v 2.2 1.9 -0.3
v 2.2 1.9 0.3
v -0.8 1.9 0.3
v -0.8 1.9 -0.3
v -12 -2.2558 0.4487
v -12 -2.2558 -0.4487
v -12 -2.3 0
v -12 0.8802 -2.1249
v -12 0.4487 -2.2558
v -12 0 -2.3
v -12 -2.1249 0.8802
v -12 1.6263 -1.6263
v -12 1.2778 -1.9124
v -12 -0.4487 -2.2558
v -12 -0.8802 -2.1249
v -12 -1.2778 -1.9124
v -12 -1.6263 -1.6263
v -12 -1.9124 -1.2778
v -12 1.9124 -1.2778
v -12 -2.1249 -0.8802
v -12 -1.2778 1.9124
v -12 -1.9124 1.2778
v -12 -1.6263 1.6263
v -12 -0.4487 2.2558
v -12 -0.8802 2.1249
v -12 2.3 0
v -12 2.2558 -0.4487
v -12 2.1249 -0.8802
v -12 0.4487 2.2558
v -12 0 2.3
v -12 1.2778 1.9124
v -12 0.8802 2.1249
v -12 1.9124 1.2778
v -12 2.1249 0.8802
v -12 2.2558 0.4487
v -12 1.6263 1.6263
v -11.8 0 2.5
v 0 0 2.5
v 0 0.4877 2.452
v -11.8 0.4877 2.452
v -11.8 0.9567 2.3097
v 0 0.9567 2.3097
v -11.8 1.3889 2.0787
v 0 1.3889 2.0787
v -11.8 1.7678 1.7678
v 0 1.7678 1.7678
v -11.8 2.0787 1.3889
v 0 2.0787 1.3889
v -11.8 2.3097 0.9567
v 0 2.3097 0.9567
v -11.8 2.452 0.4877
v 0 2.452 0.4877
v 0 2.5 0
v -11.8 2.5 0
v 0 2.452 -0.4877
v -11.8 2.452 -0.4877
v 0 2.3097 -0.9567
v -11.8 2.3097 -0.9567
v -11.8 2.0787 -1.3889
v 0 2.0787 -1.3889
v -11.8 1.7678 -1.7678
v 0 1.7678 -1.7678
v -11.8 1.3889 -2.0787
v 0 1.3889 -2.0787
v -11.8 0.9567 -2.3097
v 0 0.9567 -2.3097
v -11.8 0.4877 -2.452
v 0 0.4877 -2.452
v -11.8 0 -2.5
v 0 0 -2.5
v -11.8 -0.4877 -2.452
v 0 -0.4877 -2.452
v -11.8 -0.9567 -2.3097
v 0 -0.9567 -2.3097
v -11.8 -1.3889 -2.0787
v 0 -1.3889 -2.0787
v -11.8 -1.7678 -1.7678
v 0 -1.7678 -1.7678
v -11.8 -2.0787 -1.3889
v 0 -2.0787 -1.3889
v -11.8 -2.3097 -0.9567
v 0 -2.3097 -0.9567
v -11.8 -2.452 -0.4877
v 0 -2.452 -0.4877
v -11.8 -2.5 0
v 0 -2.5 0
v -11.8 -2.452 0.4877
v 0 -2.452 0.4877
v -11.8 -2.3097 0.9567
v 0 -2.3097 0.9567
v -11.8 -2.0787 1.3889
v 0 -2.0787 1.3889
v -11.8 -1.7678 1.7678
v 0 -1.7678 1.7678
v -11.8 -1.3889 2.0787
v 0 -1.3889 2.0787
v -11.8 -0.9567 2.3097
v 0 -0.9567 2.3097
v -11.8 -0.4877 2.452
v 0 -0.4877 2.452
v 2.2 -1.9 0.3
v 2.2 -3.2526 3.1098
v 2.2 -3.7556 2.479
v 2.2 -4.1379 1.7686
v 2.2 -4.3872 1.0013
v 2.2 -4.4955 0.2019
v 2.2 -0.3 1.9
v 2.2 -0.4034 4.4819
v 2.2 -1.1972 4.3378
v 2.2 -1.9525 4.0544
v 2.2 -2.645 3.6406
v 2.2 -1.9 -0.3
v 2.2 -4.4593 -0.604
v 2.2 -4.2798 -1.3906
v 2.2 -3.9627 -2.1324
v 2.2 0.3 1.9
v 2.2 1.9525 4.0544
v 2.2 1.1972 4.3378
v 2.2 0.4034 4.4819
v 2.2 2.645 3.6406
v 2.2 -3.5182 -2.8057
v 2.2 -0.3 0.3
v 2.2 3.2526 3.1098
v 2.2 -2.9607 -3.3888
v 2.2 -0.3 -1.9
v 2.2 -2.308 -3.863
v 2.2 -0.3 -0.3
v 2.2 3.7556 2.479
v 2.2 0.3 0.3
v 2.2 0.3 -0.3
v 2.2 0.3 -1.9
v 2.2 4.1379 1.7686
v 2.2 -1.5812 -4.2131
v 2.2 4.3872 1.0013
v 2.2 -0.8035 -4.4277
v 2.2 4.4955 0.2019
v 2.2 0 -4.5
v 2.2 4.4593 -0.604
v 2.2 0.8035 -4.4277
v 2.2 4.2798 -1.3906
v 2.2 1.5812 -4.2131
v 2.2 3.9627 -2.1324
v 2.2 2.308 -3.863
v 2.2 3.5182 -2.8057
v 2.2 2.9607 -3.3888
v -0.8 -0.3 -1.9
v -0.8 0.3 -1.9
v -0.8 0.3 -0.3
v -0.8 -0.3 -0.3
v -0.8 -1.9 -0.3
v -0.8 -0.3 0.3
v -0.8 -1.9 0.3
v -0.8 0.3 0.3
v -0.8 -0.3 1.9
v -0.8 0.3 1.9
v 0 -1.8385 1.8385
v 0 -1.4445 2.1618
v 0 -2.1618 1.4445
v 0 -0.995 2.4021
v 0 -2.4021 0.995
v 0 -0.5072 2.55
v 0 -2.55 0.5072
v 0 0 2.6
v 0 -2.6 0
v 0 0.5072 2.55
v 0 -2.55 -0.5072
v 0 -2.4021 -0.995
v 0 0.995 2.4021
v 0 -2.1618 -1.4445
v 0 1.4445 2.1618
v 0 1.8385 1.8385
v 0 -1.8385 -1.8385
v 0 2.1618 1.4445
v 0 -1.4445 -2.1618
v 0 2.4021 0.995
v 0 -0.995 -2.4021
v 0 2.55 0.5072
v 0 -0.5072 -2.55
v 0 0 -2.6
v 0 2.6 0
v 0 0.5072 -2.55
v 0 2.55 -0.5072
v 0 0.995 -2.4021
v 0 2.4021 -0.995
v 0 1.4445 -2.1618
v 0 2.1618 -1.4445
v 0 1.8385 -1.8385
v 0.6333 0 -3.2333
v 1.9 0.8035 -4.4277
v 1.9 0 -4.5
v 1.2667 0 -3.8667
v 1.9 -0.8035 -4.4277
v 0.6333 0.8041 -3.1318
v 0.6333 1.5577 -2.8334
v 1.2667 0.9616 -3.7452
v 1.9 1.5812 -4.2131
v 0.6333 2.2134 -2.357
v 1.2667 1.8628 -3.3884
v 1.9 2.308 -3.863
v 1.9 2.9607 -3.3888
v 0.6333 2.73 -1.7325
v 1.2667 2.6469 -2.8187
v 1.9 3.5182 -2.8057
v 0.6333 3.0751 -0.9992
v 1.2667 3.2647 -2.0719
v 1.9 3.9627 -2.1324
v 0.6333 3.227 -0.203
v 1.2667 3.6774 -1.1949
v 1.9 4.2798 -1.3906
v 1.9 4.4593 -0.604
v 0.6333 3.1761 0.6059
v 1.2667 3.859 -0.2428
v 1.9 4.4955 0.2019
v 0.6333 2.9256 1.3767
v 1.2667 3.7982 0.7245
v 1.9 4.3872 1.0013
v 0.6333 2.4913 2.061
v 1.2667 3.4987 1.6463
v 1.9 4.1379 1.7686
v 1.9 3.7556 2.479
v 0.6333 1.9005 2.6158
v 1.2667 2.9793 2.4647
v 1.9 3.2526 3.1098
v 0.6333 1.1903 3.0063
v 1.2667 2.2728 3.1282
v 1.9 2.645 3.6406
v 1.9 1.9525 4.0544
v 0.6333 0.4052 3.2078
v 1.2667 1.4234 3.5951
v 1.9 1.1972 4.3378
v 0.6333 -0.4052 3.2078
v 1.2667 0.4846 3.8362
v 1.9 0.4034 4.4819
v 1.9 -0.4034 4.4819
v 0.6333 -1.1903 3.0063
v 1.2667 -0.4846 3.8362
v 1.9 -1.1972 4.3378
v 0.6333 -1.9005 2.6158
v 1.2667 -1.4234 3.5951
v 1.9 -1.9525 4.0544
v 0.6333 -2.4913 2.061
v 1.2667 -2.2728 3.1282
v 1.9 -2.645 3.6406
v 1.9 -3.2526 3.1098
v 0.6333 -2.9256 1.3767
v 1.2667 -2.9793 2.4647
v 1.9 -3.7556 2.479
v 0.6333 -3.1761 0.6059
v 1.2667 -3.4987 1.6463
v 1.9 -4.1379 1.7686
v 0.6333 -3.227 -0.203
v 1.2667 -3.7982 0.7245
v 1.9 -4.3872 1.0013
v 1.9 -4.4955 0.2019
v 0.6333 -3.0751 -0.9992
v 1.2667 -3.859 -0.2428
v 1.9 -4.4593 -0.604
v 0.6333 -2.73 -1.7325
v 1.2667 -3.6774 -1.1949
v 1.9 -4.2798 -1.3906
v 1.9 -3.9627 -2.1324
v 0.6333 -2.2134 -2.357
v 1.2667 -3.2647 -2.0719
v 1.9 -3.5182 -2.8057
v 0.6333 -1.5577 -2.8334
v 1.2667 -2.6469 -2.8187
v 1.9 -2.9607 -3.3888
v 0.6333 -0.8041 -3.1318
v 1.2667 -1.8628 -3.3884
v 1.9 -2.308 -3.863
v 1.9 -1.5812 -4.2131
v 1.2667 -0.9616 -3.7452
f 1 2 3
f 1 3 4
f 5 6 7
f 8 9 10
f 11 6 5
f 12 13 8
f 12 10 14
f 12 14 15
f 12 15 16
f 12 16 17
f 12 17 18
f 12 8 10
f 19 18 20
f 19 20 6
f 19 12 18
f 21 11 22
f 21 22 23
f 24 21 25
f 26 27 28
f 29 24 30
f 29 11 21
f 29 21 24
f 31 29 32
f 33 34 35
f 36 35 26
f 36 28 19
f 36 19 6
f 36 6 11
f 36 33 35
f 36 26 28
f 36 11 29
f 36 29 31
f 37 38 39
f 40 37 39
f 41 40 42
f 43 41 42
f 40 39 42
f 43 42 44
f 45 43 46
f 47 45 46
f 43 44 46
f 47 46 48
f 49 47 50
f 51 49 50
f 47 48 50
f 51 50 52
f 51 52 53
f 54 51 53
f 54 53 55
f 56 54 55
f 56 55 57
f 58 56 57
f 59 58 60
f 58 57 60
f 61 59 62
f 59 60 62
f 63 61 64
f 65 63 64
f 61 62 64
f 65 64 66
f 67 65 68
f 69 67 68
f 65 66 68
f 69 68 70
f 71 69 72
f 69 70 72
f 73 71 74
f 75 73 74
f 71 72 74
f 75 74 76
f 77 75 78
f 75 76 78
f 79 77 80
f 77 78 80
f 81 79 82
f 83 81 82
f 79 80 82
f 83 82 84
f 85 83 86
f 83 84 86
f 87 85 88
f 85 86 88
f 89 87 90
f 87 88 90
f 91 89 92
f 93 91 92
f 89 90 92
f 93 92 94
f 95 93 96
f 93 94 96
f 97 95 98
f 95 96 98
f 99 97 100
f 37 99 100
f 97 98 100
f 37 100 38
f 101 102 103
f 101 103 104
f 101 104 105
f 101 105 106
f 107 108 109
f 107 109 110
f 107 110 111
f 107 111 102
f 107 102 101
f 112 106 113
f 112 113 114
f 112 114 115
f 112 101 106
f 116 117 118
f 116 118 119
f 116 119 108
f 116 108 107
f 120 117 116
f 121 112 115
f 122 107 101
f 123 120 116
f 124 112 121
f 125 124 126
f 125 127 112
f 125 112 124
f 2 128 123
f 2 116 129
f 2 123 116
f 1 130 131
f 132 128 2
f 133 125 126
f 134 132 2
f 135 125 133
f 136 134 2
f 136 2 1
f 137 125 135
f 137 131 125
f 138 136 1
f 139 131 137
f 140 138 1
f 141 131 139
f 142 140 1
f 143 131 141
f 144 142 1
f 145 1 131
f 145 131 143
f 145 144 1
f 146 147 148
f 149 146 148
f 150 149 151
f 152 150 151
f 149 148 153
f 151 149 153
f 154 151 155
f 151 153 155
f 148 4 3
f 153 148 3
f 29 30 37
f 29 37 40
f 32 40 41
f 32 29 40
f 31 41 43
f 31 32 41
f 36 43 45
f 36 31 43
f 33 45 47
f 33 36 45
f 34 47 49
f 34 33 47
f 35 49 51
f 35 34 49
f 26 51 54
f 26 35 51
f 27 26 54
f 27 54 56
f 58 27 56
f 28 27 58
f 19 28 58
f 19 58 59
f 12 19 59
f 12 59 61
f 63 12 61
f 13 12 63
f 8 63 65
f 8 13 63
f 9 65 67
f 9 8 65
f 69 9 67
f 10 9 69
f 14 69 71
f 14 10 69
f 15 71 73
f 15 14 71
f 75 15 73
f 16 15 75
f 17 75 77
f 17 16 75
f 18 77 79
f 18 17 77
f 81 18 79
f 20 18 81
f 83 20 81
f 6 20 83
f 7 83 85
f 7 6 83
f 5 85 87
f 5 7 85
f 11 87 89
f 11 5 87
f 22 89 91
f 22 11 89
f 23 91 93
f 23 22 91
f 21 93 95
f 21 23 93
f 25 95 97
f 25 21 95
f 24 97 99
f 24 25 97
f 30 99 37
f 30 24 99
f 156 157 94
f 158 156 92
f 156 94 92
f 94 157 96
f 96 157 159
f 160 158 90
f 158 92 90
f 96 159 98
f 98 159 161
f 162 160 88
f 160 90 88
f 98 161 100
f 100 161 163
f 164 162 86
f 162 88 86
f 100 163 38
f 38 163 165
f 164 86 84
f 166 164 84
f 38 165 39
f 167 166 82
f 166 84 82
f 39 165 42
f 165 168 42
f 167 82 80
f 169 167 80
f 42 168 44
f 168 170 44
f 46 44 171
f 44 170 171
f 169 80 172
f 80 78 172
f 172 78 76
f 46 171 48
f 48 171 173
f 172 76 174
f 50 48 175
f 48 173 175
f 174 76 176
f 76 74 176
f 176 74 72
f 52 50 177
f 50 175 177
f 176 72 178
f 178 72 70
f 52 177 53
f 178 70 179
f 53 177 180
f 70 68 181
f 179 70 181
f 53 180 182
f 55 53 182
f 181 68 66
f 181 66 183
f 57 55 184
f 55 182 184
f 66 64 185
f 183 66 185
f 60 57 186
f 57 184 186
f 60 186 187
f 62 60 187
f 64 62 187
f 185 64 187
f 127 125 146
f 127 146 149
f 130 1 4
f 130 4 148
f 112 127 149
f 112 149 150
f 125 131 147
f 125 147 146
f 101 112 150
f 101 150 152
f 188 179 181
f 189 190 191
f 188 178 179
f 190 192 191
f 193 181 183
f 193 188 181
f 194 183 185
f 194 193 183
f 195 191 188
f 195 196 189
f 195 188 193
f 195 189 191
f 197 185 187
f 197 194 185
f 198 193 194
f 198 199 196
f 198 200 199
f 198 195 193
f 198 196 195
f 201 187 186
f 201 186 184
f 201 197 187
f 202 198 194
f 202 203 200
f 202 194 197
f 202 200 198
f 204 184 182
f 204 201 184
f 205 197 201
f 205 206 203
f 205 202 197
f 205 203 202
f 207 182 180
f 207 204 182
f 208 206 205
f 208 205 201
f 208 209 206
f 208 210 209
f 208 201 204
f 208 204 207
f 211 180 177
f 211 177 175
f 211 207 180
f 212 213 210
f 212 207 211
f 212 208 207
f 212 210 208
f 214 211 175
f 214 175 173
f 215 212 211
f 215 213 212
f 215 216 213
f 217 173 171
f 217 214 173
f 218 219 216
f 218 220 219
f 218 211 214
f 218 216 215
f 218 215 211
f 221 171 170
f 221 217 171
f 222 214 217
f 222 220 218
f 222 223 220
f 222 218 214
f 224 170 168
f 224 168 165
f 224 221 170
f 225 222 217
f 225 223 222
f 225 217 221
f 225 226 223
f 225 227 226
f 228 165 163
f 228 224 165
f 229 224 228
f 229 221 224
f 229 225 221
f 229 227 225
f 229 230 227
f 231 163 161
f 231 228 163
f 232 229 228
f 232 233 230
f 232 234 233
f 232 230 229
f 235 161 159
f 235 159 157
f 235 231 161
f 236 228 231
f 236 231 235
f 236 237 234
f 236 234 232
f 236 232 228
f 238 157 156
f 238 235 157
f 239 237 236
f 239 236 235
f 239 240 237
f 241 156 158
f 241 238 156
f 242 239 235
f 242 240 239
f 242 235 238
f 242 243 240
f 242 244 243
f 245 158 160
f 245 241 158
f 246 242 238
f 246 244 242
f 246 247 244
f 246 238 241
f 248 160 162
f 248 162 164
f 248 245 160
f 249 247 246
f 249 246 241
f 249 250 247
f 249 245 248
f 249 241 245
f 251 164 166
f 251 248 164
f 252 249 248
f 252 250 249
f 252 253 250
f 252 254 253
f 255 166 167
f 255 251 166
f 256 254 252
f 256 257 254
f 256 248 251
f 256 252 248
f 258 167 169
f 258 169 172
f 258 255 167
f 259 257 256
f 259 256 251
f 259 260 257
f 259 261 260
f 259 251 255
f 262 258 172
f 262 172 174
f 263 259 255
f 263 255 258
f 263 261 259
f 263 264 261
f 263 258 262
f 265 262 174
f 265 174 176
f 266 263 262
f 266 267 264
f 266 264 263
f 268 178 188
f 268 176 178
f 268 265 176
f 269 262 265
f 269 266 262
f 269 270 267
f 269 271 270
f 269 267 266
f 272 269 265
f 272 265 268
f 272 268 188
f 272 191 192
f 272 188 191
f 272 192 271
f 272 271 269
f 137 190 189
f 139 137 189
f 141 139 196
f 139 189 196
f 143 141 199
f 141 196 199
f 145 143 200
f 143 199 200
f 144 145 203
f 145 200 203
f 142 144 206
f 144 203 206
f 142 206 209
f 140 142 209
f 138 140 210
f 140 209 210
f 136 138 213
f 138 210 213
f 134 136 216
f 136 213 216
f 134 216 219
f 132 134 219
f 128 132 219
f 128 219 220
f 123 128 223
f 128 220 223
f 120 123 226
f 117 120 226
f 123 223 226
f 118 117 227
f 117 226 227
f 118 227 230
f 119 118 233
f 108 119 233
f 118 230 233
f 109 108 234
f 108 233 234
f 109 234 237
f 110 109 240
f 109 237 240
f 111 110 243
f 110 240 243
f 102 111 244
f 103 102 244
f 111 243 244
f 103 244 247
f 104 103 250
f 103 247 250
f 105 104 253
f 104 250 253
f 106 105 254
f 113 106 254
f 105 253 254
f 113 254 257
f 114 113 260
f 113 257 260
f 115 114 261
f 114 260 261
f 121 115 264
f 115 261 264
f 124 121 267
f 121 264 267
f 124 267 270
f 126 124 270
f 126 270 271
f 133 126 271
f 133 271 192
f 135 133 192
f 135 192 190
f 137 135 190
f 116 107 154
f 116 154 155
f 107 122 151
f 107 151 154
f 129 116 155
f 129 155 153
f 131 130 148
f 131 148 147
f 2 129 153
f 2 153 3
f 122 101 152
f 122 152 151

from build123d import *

# Parameters (mm, degrees)
SKETCH_1_R          = 4.5
EXTRUDE_1_DEPTH     = 2.2
SKETCH_2_R          = 2.5
EXTRUDE_3_DEPTH     = 12
CHAMFER_2_SIZE      = 0.2
CHAMFER_3_SIZE      = 1.9
CUT_EXTRUDE_2_DEPTH = 3


with BuildPart() as part:
    # 草图1 → 凸台-拉伸1 (new body)
    with BuildSketch(Plane(origin=(0, 0, 0), x_dir=(0, 0, -1), z_dir=(1, 0, 0))):
        Circle(SKETCH_1_R)
    extrude(amount=EXTRUDE_1_DEPTH)

    # 草图2 → 凸台-拉伸3 (add)
    with BuildSketch(Plane.ZY):
        Circle(SKETCH_2_R)
    extrude(amount=EXTRUDE_3_DEPTH)

    # 倒角2
    chamfer_2_edges = [part.edges().sort_by_distance(p)[0] for p in [
        (-12, 0, -2.5),
    ]]
    chamfer(chamfer_2_edges, length=CHAMFER_2_SIZE)

    # 倒角3
    chamfer_3_edges = [part.edges().sort_by_distance(p)[0] for p in [
        (0, 0, 4.5),
    ]]
    chamfer(chamfer_3_edges, length=CHAMFER_3_SIZE)

    # 草图5 → 切除-拉伸2 (cut)
    with BuildSketch(Plane(origin=(2.2, 0, 0), x_dir=(0, 0, -1), z_dir=(1, 0, 0))):
        Polygon((0.3, 0.3), (1.9, 0.3), (1.9, -0.3), (0.3, -0.3), (0.3, -1.9), (-0.3, -1.9), (-0.3, -0.3), (-1.9, -0.3), (-1.9, 0.3), (-0.3, 0.3), (-0.3, 1.9), (0.3, 1.9), align=None)
    extrude(amount=-CUT_EXTRUDE_2_DEPTH, mode=Mode.SUBTRACT)


solid = part.part
